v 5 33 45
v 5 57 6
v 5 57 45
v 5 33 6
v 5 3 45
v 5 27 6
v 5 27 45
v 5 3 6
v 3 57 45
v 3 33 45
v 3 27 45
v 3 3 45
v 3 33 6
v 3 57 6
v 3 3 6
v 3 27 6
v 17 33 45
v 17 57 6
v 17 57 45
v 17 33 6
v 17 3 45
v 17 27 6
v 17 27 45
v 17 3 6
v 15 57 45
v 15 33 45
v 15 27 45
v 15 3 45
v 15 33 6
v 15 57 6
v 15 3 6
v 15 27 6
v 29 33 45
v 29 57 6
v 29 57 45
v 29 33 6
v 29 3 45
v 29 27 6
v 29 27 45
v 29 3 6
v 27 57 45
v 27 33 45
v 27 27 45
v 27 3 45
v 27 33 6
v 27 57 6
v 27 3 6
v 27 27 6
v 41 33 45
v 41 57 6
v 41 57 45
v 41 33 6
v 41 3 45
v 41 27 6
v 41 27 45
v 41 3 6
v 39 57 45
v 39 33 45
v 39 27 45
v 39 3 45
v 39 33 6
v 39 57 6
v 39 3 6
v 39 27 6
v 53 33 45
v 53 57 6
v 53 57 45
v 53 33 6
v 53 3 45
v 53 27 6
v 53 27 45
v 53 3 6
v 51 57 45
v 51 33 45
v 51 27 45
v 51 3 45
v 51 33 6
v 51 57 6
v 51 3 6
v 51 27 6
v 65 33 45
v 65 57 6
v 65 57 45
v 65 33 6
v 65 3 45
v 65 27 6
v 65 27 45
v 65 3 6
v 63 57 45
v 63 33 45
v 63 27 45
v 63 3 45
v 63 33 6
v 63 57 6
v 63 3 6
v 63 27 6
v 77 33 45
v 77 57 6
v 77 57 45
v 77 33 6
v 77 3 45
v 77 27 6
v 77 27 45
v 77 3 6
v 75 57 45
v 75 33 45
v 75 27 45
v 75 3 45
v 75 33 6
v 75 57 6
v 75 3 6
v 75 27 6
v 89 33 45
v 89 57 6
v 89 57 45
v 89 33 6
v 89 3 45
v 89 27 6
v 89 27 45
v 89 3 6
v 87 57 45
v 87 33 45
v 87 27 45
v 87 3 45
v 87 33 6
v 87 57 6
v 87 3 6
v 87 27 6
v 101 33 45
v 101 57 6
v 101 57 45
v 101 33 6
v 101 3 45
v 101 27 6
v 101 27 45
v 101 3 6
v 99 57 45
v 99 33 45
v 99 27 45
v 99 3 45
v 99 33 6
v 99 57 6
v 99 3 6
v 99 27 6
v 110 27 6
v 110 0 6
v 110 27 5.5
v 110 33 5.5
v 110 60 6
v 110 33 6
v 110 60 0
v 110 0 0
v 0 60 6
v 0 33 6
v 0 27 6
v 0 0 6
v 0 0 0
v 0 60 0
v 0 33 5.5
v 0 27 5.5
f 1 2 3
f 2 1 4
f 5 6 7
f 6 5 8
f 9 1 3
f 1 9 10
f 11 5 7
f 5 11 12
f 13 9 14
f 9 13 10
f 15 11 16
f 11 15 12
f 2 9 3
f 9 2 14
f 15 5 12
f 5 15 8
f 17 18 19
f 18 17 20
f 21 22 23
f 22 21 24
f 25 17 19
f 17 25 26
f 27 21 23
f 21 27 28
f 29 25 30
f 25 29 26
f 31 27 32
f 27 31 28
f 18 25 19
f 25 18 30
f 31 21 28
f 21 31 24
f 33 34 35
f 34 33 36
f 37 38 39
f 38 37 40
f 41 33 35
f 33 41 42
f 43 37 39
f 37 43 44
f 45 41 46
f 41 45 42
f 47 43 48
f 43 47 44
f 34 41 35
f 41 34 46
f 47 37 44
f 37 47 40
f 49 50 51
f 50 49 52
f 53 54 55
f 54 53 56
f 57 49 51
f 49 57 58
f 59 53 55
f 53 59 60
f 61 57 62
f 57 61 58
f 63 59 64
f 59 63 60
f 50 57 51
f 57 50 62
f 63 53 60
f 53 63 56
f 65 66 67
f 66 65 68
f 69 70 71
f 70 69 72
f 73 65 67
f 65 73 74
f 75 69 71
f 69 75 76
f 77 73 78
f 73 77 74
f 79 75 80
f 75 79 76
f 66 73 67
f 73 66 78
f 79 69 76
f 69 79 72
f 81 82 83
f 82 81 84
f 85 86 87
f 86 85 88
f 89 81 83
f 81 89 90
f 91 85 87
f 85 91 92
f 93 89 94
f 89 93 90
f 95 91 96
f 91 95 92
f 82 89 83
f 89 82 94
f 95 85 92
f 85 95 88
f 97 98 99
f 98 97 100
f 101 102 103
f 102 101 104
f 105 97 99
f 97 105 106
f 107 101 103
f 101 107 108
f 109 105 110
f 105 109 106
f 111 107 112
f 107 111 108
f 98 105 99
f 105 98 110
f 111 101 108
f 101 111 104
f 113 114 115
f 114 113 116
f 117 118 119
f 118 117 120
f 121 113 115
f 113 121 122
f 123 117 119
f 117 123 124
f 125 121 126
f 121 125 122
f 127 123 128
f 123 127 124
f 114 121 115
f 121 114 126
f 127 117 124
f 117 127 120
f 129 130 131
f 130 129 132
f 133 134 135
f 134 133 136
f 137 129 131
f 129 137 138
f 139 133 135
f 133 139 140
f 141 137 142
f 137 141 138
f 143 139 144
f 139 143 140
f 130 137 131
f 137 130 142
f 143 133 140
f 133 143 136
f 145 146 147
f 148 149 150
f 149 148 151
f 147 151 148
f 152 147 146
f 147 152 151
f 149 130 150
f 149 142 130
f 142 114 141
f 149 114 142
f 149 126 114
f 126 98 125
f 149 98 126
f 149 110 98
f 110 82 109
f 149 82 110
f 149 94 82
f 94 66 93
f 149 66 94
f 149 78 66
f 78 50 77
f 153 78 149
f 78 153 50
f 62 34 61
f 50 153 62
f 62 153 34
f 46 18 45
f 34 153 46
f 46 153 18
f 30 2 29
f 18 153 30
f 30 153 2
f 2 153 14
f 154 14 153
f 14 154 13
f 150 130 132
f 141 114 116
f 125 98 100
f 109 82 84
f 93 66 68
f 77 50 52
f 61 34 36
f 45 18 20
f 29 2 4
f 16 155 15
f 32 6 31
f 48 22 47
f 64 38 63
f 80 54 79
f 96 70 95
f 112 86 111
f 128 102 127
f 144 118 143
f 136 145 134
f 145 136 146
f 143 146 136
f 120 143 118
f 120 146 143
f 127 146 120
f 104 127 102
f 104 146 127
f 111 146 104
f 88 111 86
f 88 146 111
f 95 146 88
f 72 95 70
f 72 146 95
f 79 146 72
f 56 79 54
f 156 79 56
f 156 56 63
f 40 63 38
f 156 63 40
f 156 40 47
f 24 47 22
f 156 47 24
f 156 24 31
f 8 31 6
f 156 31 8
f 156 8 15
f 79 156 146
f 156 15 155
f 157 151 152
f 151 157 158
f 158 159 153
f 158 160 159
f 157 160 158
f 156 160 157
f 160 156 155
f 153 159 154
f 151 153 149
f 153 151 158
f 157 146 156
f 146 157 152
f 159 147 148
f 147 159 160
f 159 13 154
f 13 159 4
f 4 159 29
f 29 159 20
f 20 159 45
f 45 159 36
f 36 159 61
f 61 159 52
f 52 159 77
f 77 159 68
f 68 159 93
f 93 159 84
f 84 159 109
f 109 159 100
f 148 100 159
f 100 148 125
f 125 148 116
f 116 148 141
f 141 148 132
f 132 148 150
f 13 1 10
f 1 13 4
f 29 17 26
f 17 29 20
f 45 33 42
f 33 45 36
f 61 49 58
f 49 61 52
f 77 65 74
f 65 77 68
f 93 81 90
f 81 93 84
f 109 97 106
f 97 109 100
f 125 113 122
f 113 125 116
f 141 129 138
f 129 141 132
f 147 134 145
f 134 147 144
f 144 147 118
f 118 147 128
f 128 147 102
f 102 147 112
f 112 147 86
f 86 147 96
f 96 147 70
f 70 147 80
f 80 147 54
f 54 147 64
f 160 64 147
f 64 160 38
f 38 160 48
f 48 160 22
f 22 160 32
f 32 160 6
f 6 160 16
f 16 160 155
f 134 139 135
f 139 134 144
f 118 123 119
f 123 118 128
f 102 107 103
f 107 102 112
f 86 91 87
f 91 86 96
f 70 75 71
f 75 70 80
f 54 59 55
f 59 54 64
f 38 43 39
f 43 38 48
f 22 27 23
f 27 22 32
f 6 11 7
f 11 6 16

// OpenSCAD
$fn = 32;

// ----------------------------------------------------------------------
// Heatsink: slotted fin block
// ----------------------------------------------------------------------

// --- parameters (mm) ---
base_l = 110;             // base length, X
base_w = 60;              // base width, Y
base_t = 6;               // base plate thickness
fin_h = 40;               // fin height above the base
fin_t = 2;                // fin thickness
edge = 3;                 // margin from the base ends
pitch = 12;               // fin pitch
slot_w = 6;               // central slot width, Y

n_fins = floor((base_l - 2 * edge - fin_t) / pitch) + 1;  // fin count
total_h = base_t + fin_h - 1;  // overall height

difference() {
union() {
  cube([base_l, base_w, base_t]);
  for (i = [0 : n_fins - 1])
    translate([edge + i * pitch, edge, base_t - 1])
      cube([fin_t, base_w - 2 * edge, fin_h]);
}
  translate([-1, base_w / 2 - slot_w / 2, base_t - 0.5])
    cube([base_l + 2, slot_w, fin_h + 2]);
}
